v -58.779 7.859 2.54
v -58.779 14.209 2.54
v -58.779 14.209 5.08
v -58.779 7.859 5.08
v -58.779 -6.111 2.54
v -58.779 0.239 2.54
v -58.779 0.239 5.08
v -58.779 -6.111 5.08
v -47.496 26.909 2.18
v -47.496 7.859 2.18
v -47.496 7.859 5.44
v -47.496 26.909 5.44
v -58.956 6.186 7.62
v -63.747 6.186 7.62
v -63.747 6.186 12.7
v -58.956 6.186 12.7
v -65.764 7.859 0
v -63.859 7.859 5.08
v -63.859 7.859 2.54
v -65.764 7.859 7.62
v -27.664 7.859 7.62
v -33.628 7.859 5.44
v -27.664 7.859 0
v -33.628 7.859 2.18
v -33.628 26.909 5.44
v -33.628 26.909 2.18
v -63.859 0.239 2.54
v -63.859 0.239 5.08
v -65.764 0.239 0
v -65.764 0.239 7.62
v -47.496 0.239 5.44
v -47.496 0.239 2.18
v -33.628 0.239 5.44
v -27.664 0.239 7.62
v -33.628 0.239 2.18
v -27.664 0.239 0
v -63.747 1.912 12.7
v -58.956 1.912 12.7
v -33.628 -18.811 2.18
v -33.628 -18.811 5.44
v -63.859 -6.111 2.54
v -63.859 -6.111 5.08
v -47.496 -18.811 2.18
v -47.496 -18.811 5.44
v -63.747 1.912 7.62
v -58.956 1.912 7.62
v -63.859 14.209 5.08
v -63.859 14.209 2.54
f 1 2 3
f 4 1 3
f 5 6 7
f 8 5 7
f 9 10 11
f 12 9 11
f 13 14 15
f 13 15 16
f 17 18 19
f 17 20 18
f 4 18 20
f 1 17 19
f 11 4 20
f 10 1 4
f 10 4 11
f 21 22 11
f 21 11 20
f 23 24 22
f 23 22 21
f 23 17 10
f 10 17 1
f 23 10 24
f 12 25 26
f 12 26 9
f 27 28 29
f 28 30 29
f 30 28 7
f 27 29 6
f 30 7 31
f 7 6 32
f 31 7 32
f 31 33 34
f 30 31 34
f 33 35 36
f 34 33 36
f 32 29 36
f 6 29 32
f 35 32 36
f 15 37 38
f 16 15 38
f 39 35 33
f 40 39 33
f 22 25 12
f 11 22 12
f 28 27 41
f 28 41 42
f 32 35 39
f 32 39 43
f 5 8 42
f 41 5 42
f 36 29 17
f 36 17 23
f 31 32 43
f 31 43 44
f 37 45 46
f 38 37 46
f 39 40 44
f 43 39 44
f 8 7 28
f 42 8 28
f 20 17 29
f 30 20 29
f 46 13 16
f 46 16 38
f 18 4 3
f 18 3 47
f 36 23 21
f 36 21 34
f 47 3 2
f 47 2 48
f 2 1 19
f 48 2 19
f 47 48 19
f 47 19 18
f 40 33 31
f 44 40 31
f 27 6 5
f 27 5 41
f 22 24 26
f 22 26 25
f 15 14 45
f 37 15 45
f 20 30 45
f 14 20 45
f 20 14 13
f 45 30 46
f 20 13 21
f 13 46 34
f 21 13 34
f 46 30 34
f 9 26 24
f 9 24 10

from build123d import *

# Parameters (mm, degrees)
F0_W     = 38.1
F0_H     = 3.81
F1_DEPTH = 7.62
F2_W     = 13.867821
F2_H     = 3.260234
F3_DEPTH = 19.05
F4_W     = 5.08
F4_H     = 2.54
F5_DEPTH = 6.35
F6_W     = 4.791245
F6_H     = 2.137142
F7_DEPTH = 5.08


with BuildPart() as f1:
    # F0 (on Top) → F1 (new body)
    with BuildSketch(Plane.XY):
        with Locations((-46.713926, 5.953849)):
            Rectangle(F0_W, F0_H)
    extrude(amount=F1_DEPTH)

    # F2 (on face) → F3 (join)
    with BuildSketch(Plane(origin=(0, 7.858849, 0), x_dir=(-1, 0, 0), z_dir=(0, 1, 0))):
        with Locations((40.561947, 3.81)):
            Rectangle(F2_W, F2_H)
    extrude(amount=F3_DEPTH)

    # F4 (on face) → F5 (join)
    with BuildSketch(Plane(origin=(0, 7.858849, 0), x_dir=(-1, 0, 0), z_dir=(0, 1, 0))):
        with Locations((61.318926, 3.81)):
            Rectangle(F4_W, F4_H)
    extrude(amount=F5_DEPTH)

    # F6 (on face) → F7 (join)
    with BuildSketch(Plane.XY.offset(7.62)):
        with Locations((-61.35144, 5.11742)):
            Rectangle(F6_W, F6_H)
    extrude(amount=F7_DEPTH)

    # F8: F1 across face


with BuildPart() as f1_1:
    add(f1.part)
    add(f1.part.mirror(Plane(origin=(-47.846159, 4.048849, 4.301182), x_dir=(1, 0, 0), z_dir=(0, -1, 0))))


solid = f1_1.part
